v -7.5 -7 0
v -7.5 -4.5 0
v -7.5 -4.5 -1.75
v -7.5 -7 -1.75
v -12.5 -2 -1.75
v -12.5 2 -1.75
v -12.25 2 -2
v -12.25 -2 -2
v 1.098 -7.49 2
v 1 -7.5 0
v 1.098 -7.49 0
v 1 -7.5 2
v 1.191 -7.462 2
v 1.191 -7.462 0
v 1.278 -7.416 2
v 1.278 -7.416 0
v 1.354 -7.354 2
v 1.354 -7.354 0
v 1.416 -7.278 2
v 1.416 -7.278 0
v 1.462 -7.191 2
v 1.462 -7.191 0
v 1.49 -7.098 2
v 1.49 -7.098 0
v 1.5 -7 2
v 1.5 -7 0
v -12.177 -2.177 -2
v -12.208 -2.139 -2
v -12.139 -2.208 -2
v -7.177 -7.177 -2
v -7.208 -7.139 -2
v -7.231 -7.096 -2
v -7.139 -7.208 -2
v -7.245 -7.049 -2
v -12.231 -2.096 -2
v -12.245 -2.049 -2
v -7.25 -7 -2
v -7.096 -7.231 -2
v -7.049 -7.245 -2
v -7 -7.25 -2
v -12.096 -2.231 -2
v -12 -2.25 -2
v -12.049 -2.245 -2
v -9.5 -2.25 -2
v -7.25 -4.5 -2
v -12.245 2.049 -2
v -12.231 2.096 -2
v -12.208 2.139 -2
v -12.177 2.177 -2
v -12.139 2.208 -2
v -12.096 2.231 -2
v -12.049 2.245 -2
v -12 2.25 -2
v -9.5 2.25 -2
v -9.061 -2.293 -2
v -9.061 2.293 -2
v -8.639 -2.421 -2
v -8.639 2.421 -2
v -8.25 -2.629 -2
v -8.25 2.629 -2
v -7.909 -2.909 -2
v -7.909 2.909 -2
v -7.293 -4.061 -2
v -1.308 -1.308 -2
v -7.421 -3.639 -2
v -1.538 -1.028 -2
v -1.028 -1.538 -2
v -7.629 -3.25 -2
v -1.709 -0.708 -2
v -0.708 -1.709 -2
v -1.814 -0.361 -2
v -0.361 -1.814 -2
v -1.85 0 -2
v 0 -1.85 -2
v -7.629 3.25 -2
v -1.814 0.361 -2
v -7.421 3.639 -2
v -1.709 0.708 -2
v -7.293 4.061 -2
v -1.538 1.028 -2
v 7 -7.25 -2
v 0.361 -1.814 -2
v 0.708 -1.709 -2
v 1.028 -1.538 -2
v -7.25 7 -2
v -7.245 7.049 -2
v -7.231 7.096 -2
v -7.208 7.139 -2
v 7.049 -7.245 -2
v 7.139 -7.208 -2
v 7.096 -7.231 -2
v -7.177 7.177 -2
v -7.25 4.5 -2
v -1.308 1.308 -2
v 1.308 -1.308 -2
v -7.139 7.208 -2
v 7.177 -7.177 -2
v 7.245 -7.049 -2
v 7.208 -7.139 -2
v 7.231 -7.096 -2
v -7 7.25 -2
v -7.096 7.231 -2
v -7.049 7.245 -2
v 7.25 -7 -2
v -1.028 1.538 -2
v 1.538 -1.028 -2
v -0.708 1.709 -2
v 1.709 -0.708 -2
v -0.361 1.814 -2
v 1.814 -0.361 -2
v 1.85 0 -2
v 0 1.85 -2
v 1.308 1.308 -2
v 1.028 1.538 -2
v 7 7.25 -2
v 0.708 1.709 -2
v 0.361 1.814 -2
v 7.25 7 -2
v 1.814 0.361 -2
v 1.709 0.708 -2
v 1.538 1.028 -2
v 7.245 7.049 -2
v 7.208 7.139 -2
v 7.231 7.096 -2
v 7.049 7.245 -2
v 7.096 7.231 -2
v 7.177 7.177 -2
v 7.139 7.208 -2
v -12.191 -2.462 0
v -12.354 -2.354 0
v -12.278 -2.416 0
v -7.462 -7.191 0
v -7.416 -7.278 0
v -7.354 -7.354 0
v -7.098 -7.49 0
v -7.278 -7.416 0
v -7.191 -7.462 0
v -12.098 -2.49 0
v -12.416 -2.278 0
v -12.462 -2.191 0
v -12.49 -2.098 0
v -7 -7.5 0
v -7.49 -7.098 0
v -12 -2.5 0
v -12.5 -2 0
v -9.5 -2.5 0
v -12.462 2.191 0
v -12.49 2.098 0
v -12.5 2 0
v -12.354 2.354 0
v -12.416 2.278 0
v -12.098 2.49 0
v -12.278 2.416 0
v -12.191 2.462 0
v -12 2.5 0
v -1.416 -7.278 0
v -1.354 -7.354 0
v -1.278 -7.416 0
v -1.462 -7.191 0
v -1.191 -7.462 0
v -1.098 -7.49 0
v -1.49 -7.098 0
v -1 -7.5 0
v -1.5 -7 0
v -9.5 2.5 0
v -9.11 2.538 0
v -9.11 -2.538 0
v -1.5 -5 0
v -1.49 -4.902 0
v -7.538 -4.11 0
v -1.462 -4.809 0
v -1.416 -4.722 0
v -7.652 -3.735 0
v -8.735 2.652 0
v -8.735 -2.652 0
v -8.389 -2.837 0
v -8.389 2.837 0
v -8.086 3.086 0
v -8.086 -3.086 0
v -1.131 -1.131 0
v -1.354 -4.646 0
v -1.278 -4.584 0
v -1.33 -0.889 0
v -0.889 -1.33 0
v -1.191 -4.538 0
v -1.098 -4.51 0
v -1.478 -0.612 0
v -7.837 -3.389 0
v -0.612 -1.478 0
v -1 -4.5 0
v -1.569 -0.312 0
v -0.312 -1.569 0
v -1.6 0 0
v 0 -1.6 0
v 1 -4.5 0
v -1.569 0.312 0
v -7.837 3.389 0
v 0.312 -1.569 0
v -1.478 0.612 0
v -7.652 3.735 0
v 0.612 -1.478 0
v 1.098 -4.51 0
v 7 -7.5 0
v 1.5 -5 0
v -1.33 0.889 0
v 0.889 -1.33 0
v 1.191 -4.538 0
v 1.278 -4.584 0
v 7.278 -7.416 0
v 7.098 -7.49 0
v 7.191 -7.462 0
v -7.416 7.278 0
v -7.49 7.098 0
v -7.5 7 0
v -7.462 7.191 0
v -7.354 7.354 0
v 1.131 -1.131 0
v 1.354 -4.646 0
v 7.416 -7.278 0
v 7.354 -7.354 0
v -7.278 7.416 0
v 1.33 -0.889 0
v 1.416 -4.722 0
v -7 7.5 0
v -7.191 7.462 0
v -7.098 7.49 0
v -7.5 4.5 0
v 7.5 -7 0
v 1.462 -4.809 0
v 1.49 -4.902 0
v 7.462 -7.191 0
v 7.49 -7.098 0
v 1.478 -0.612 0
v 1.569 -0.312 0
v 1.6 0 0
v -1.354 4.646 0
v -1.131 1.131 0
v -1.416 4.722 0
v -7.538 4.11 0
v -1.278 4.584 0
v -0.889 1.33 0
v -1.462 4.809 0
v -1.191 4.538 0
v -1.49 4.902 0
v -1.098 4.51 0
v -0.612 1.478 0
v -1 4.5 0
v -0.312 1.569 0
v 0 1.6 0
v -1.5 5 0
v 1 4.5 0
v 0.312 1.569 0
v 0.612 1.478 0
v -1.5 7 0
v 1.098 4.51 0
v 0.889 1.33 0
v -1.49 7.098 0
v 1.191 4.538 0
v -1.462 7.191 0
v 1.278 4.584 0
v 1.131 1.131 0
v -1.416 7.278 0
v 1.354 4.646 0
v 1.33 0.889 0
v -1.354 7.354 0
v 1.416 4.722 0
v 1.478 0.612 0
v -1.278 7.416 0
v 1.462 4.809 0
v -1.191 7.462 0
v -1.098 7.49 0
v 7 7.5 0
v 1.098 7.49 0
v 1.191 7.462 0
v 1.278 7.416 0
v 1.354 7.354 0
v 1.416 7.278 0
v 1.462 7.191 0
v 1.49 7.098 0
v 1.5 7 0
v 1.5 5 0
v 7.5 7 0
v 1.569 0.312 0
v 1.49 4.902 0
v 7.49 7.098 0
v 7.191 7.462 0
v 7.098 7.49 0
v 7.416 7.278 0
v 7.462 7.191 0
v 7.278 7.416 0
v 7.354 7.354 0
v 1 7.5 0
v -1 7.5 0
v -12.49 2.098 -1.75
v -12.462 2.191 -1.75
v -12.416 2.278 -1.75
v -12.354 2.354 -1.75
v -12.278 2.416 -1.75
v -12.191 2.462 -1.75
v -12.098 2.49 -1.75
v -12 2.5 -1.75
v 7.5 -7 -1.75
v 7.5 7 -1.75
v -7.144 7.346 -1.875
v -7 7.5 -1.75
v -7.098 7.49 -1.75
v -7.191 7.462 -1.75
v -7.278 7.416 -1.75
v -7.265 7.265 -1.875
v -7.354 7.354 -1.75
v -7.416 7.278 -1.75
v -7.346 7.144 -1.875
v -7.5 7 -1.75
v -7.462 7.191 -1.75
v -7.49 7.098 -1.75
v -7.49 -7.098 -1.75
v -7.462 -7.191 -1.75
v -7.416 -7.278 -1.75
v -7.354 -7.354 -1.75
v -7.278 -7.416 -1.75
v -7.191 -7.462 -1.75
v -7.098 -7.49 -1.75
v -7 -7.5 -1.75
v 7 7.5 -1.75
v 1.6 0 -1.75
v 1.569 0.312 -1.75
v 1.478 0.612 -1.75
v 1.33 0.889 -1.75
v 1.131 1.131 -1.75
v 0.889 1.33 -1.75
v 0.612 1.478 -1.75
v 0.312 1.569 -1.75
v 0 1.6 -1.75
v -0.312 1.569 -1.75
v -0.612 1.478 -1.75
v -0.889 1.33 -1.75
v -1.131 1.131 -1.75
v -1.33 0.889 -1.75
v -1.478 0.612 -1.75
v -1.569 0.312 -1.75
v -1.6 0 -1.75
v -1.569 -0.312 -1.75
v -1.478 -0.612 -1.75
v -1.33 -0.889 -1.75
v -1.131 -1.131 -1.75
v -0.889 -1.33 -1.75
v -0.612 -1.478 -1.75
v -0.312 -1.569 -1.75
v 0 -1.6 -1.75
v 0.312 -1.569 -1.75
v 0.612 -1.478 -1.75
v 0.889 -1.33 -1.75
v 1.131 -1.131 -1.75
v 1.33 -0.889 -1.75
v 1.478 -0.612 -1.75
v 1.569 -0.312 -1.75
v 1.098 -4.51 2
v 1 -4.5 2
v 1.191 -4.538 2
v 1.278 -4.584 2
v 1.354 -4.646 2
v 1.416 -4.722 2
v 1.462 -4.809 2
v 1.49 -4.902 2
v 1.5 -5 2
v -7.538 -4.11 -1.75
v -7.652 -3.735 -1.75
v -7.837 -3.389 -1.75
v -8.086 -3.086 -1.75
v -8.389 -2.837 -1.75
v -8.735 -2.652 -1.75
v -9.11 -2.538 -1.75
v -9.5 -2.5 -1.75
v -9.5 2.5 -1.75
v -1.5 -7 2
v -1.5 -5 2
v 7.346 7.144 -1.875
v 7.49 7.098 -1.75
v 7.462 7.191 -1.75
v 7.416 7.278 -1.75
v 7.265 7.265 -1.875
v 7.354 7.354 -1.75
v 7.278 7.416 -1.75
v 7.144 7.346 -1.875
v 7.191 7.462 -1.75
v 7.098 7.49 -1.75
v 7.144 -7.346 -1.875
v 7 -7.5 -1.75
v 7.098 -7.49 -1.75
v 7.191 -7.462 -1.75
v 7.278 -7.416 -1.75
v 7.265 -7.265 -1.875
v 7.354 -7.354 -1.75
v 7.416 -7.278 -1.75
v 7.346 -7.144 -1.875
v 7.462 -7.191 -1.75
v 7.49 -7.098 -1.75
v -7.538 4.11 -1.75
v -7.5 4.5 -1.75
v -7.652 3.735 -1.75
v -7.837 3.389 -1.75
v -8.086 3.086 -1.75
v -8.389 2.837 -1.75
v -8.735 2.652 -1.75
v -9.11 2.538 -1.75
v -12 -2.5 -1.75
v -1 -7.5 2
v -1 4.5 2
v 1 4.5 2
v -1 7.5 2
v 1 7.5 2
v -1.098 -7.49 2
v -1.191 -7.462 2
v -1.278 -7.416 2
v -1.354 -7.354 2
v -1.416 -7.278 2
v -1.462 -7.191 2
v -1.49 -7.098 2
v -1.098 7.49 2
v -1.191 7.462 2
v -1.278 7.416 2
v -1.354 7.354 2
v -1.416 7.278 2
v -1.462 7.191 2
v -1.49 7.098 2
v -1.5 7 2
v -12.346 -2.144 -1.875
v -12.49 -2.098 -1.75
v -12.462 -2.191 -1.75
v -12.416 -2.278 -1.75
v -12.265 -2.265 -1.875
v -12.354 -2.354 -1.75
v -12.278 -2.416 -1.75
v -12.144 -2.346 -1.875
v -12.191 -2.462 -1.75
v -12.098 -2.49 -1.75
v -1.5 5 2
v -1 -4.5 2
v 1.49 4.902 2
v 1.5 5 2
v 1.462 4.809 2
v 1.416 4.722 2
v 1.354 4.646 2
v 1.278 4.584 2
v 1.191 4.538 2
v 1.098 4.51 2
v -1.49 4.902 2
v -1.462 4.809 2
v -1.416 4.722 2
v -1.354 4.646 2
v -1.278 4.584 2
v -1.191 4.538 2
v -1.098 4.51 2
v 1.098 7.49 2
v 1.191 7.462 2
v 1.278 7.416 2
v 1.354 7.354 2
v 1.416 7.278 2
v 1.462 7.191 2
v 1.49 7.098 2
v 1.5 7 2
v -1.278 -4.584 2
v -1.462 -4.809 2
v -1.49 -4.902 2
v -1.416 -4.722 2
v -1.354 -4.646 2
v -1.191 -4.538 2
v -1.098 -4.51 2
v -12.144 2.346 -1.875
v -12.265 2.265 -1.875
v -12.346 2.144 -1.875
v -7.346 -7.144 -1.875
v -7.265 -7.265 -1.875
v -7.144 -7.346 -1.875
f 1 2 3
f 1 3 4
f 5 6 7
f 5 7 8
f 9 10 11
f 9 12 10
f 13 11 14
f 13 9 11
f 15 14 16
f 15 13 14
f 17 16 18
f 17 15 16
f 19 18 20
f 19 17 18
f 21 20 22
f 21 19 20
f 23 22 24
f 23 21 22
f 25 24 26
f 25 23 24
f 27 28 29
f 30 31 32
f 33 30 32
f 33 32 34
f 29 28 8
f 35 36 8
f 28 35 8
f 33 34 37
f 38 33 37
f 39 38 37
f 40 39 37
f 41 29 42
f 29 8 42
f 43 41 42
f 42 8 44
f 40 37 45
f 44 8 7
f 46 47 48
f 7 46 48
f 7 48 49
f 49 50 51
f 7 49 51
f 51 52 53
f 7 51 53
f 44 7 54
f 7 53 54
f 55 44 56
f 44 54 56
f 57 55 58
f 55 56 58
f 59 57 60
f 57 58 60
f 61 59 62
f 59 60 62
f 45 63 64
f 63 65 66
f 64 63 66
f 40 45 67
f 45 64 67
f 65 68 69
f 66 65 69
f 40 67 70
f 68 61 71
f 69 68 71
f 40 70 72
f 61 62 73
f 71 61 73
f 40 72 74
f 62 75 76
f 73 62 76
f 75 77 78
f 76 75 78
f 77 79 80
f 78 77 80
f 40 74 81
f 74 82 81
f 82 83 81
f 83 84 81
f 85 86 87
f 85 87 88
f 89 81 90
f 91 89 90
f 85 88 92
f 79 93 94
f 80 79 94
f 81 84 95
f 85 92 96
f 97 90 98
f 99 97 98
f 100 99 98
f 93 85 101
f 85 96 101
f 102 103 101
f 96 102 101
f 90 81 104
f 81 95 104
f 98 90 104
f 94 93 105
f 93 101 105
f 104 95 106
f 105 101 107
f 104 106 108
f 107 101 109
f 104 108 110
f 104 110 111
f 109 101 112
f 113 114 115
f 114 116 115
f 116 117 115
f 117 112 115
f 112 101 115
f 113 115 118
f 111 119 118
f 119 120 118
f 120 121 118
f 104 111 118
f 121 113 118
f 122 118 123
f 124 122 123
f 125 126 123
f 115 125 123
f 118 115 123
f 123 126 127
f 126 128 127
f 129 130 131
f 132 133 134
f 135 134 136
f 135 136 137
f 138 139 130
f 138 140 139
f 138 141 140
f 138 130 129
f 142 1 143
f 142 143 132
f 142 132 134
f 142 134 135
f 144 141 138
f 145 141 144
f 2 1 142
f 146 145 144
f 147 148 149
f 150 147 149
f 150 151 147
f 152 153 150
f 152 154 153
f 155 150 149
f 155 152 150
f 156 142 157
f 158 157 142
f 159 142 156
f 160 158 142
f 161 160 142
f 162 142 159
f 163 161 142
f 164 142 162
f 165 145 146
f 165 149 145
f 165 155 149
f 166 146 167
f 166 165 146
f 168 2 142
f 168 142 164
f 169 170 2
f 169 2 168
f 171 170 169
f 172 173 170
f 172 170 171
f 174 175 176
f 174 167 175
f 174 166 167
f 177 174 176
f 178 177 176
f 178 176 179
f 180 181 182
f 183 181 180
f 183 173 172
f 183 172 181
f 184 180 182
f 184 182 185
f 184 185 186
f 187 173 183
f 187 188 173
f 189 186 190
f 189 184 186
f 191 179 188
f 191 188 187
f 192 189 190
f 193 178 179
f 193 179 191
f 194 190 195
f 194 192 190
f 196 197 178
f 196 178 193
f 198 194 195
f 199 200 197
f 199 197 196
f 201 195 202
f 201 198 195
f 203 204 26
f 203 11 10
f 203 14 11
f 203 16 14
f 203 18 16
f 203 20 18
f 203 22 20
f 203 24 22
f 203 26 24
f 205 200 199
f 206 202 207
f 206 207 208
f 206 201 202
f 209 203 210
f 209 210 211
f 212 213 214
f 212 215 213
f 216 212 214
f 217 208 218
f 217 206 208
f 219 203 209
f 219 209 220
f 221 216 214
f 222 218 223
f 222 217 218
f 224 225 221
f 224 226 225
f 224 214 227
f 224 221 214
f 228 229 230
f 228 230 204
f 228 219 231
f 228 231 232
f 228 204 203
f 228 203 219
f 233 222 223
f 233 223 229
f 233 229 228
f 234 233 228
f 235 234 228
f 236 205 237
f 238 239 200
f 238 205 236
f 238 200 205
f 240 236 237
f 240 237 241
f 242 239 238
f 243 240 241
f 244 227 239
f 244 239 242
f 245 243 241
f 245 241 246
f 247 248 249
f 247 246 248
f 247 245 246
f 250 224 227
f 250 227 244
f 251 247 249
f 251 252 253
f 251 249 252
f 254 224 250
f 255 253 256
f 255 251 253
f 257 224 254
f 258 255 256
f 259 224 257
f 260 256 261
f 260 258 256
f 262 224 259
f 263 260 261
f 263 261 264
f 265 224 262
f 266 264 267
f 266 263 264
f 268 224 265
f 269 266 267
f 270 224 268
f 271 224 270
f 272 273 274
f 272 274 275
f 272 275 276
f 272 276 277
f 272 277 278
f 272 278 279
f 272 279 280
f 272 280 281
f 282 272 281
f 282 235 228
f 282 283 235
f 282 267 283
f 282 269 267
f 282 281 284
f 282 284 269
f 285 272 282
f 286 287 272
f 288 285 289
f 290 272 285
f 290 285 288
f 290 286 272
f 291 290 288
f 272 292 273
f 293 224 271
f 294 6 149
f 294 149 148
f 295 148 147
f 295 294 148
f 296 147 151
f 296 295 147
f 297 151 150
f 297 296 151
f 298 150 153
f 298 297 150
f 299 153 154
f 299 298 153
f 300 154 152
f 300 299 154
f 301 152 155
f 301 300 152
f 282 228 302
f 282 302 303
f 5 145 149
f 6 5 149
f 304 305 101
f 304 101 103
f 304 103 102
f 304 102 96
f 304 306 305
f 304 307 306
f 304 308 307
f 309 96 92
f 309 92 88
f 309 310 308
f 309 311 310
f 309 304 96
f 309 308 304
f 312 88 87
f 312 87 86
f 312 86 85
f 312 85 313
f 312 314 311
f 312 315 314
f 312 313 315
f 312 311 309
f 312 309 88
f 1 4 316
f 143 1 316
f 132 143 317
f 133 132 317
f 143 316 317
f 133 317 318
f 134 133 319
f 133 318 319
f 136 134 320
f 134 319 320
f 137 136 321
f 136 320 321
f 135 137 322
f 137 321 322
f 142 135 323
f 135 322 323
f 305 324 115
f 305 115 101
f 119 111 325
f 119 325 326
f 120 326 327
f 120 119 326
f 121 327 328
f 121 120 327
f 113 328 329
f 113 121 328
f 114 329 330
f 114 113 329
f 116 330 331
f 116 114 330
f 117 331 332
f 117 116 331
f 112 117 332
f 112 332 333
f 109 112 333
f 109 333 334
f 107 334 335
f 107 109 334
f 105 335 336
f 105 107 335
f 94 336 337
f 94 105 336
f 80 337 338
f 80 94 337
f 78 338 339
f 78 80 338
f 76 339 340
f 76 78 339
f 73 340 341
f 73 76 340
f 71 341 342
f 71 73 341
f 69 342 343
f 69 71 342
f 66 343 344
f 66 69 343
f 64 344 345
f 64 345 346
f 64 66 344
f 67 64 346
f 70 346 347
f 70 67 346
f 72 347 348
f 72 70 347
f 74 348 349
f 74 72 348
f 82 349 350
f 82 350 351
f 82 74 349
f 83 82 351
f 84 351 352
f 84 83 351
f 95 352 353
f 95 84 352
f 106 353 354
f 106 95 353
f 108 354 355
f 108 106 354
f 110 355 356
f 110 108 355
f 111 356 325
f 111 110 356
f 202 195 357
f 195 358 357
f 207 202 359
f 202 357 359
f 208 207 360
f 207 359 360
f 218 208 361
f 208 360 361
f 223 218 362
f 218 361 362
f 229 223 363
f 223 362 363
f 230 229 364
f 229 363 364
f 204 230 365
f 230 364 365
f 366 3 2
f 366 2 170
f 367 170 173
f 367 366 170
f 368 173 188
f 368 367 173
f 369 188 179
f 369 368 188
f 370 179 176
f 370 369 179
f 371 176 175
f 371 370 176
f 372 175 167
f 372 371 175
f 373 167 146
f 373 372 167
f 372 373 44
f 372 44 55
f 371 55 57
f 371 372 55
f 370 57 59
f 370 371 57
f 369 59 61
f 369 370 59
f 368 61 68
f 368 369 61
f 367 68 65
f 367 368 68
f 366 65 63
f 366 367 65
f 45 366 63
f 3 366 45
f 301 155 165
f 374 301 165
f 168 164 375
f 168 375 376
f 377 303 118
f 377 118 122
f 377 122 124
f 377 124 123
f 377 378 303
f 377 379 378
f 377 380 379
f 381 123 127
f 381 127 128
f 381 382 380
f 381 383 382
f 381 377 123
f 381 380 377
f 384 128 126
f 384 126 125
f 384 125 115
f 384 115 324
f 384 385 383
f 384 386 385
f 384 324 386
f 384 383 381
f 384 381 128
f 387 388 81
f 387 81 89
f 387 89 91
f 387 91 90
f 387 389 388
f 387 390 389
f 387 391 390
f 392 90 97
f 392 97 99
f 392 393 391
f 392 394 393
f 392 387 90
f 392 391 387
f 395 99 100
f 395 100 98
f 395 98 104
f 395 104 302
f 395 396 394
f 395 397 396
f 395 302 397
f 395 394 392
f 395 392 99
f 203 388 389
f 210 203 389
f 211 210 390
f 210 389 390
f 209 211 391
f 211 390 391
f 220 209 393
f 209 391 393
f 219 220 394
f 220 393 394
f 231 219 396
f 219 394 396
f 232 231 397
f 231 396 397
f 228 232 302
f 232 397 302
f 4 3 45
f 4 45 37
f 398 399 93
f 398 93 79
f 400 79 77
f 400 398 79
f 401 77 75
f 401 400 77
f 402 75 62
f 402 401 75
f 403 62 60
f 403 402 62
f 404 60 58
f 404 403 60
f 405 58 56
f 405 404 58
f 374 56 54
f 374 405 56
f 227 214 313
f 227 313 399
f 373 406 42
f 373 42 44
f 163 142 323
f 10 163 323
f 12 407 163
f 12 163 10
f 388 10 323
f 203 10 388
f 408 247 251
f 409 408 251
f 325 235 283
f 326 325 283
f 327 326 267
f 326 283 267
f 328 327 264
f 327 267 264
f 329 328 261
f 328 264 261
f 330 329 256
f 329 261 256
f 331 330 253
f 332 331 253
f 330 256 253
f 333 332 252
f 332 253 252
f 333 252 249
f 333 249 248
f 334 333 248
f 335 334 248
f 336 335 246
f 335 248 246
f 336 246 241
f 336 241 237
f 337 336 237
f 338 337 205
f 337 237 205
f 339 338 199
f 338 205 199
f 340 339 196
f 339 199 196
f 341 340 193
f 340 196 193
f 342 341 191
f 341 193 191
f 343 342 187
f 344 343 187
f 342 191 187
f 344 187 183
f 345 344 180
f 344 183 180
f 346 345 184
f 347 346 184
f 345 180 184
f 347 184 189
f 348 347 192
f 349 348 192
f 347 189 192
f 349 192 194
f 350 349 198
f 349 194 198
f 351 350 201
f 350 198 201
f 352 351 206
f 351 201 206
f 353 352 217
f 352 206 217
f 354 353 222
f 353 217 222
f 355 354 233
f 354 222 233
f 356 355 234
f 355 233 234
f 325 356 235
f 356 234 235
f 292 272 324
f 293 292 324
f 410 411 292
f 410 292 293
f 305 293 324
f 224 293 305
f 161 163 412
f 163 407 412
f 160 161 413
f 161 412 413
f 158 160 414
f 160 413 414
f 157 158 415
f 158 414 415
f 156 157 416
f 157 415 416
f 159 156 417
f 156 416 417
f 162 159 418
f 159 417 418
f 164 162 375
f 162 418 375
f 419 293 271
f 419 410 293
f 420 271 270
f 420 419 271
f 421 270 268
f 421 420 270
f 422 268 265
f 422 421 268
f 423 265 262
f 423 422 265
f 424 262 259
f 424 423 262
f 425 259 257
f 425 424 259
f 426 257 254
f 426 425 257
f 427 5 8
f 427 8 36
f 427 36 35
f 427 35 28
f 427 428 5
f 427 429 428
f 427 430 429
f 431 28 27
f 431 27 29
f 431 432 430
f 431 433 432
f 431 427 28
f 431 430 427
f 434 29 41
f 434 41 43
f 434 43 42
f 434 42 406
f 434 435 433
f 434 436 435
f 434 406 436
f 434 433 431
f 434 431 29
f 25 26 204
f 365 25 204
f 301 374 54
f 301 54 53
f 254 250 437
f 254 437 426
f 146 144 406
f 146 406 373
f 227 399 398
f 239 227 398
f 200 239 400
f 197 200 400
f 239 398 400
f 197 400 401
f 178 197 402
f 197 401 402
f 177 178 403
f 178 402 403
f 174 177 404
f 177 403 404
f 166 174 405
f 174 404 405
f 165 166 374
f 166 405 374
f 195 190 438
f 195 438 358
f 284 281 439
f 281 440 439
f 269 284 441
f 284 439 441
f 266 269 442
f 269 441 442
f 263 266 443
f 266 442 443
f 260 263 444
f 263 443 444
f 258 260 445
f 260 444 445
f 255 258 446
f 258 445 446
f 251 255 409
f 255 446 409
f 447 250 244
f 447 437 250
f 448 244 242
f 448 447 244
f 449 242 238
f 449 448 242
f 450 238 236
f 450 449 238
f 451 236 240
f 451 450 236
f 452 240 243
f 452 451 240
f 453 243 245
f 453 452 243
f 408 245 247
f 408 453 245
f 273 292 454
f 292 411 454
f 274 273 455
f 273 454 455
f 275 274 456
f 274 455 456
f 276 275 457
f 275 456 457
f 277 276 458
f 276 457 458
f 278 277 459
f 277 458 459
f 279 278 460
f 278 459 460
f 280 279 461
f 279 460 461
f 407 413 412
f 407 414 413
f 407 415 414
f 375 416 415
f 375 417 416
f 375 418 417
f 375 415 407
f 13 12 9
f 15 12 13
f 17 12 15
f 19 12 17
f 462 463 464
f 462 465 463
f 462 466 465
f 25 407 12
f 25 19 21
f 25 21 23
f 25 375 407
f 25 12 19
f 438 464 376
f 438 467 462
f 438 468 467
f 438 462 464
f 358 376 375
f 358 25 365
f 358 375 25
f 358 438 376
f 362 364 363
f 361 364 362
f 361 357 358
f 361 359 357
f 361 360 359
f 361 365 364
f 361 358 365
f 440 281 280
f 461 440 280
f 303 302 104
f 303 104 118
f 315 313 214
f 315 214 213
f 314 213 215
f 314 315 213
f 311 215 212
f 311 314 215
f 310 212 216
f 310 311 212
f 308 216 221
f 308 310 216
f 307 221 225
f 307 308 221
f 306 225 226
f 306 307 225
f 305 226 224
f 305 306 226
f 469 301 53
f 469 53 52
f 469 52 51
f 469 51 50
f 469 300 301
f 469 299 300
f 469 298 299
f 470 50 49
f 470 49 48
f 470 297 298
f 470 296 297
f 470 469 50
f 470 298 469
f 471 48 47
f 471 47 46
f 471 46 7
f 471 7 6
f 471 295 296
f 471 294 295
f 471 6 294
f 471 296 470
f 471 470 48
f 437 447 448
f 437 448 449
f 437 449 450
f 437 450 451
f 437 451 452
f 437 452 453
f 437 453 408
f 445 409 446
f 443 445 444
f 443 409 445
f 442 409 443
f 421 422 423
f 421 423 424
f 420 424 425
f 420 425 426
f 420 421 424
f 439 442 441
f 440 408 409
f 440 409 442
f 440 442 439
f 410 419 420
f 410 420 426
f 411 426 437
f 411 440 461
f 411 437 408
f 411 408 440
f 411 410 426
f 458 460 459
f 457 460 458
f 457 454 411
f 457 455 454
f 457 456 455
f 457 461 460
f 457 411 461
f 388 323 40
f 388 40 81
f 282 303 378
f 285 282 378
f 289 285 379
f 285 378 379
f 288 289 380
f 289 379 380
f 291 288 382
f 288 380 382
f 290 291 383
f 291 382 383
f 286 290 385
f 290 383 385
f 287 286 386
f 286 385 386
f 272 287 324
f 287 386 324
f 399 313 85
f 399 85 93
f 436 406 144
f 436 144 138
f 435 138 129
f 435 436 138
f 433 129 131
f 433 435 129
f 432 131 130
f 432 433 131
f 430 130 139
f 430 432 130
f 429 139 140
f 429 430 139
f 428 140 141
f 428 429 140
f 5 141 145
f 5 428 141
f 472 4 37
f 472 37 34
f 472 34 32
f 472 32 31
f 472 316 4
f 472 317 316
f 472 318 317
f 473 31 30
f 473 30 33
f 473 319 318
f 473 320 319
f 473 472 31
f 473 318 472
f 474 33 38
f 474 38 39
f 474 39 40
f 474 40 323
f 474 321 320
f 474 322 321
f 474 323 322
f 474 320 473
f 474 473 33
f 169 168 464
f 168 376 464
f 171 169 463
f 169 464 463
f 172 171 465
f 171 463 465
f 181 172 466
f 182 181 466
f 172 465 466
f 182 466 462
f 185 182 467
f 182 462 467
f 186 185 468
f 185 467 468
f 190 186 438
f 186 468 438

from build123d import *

# Parameters (mm, degrees)
F0_R     = 1.6
F0_W     = 5
F0_H     = 5
F0_W_2   = 3
F0_H_2   = 3
F1_DEPTH = 2
F2_DEPTH = 2
F3_R     = 2
F4_R     = 0.5
F5_SIZE  = 0.25


with BuildPart() as f1:
    # F0 (on Top) → F1 (new body)
    with BuildSketch(Plane.XY):
        Polygon((7.5, -7.5), (7.5, 7.5), (1.5, 7.5), (1.5, 4.5), (-1.5, 4.5), (-1.5, 7.5), (-7.5, 7.5), (-7.5, 2.5), (-7.5, -2.5), (-7.5, -7.5), (-1.5, -7.5), (-1.5, -4.5), (1.5, -4.5), (1.5, -7.5), align=None)
        Circle(F0_R, mode=Mode.SUBTRACT)
        with Locations((-10, 0)):
            Rectangle(F0_W, F0_H)
        with Locations((0, 6)):
            Rectangle(F0_W_2, F0_H_2)
        with Locations((0, -6)):
            Rectangle(F0_W_2, F0_H_2)
    extrude(amount=-F1_DEPTH)

    # F0 (on Top) → F2 (join)
    with BuildSketch(Plane.XY):
        with Locations((0, 6)):
            Rectangle(F0_W_2, F0_H_2)
        with Locations((0, -6)):
            Rectangle(F0_W_2, F0_H_2)
    extrude(amount=F2_DEPTH)

    # F3
    f3_edges = [f1.edges().sort_by_distance(p)[0] for p in [
        (-7.5, 2.5, -1),
        (-7.5, -2.5, -1),
    ]]
    fillet(f3_edges, radius=F3_R)

    # F4
    f4_edges = [f1.edges().sort_by_distance(p)[0] for p in [
        (-12.5, 2.5, -1),
        (-12.5, -2.5, -1),
        (-7.5, -7.5, -1),
        (-7.5, 7.5, -1),
        (7.5, 7.5, -1),
        (7.5, -7.5, -1),
        (1.5, 7.5, 1),
        (1.5, 4.5, 1),
        (-1.5, 7.5, 1),
        (-1.5, 4.5, 1),
        (-1.5, -4.5, 1),
        (1.5, -4.5, 1),
        (-1.5, -7.5, 1),
        (1.5, -7.5, 1),
    ]]
    fillet(f4_edges, radius=F4_R)

    # F5
    f5_edges = [f1.edges().sort_by_distance(p)[0] for p in [
        (-7.5, 5.75, -2),
        (-7.353553, 7.353553, -2),
        (-8.085786, 3.085786, -2),
        (0, 7.5, -2),
        (-10.75, 2.5, -2),
        (7.353553, 7.353553, -2),
        (-12.353553, 2.353553, -2),
        (7.5, 0, -2),
        (-12.5, 0, -2),
        (7.353553, -7.353553, -2),
        (-12.353553, -2.353553, -2),
        (0, -7.5, -2),
        (-10.75, -2.5, -2),
        (-7.353553, -7.353553, -2),
        (-8.085786, -3.085786, -2),
        (-7.5, -5.75, -2),
        (-1.6, 0, -2),
    ]]
    chamfer(f5_edges, length=F5_SIZE)


solid = f1.part
